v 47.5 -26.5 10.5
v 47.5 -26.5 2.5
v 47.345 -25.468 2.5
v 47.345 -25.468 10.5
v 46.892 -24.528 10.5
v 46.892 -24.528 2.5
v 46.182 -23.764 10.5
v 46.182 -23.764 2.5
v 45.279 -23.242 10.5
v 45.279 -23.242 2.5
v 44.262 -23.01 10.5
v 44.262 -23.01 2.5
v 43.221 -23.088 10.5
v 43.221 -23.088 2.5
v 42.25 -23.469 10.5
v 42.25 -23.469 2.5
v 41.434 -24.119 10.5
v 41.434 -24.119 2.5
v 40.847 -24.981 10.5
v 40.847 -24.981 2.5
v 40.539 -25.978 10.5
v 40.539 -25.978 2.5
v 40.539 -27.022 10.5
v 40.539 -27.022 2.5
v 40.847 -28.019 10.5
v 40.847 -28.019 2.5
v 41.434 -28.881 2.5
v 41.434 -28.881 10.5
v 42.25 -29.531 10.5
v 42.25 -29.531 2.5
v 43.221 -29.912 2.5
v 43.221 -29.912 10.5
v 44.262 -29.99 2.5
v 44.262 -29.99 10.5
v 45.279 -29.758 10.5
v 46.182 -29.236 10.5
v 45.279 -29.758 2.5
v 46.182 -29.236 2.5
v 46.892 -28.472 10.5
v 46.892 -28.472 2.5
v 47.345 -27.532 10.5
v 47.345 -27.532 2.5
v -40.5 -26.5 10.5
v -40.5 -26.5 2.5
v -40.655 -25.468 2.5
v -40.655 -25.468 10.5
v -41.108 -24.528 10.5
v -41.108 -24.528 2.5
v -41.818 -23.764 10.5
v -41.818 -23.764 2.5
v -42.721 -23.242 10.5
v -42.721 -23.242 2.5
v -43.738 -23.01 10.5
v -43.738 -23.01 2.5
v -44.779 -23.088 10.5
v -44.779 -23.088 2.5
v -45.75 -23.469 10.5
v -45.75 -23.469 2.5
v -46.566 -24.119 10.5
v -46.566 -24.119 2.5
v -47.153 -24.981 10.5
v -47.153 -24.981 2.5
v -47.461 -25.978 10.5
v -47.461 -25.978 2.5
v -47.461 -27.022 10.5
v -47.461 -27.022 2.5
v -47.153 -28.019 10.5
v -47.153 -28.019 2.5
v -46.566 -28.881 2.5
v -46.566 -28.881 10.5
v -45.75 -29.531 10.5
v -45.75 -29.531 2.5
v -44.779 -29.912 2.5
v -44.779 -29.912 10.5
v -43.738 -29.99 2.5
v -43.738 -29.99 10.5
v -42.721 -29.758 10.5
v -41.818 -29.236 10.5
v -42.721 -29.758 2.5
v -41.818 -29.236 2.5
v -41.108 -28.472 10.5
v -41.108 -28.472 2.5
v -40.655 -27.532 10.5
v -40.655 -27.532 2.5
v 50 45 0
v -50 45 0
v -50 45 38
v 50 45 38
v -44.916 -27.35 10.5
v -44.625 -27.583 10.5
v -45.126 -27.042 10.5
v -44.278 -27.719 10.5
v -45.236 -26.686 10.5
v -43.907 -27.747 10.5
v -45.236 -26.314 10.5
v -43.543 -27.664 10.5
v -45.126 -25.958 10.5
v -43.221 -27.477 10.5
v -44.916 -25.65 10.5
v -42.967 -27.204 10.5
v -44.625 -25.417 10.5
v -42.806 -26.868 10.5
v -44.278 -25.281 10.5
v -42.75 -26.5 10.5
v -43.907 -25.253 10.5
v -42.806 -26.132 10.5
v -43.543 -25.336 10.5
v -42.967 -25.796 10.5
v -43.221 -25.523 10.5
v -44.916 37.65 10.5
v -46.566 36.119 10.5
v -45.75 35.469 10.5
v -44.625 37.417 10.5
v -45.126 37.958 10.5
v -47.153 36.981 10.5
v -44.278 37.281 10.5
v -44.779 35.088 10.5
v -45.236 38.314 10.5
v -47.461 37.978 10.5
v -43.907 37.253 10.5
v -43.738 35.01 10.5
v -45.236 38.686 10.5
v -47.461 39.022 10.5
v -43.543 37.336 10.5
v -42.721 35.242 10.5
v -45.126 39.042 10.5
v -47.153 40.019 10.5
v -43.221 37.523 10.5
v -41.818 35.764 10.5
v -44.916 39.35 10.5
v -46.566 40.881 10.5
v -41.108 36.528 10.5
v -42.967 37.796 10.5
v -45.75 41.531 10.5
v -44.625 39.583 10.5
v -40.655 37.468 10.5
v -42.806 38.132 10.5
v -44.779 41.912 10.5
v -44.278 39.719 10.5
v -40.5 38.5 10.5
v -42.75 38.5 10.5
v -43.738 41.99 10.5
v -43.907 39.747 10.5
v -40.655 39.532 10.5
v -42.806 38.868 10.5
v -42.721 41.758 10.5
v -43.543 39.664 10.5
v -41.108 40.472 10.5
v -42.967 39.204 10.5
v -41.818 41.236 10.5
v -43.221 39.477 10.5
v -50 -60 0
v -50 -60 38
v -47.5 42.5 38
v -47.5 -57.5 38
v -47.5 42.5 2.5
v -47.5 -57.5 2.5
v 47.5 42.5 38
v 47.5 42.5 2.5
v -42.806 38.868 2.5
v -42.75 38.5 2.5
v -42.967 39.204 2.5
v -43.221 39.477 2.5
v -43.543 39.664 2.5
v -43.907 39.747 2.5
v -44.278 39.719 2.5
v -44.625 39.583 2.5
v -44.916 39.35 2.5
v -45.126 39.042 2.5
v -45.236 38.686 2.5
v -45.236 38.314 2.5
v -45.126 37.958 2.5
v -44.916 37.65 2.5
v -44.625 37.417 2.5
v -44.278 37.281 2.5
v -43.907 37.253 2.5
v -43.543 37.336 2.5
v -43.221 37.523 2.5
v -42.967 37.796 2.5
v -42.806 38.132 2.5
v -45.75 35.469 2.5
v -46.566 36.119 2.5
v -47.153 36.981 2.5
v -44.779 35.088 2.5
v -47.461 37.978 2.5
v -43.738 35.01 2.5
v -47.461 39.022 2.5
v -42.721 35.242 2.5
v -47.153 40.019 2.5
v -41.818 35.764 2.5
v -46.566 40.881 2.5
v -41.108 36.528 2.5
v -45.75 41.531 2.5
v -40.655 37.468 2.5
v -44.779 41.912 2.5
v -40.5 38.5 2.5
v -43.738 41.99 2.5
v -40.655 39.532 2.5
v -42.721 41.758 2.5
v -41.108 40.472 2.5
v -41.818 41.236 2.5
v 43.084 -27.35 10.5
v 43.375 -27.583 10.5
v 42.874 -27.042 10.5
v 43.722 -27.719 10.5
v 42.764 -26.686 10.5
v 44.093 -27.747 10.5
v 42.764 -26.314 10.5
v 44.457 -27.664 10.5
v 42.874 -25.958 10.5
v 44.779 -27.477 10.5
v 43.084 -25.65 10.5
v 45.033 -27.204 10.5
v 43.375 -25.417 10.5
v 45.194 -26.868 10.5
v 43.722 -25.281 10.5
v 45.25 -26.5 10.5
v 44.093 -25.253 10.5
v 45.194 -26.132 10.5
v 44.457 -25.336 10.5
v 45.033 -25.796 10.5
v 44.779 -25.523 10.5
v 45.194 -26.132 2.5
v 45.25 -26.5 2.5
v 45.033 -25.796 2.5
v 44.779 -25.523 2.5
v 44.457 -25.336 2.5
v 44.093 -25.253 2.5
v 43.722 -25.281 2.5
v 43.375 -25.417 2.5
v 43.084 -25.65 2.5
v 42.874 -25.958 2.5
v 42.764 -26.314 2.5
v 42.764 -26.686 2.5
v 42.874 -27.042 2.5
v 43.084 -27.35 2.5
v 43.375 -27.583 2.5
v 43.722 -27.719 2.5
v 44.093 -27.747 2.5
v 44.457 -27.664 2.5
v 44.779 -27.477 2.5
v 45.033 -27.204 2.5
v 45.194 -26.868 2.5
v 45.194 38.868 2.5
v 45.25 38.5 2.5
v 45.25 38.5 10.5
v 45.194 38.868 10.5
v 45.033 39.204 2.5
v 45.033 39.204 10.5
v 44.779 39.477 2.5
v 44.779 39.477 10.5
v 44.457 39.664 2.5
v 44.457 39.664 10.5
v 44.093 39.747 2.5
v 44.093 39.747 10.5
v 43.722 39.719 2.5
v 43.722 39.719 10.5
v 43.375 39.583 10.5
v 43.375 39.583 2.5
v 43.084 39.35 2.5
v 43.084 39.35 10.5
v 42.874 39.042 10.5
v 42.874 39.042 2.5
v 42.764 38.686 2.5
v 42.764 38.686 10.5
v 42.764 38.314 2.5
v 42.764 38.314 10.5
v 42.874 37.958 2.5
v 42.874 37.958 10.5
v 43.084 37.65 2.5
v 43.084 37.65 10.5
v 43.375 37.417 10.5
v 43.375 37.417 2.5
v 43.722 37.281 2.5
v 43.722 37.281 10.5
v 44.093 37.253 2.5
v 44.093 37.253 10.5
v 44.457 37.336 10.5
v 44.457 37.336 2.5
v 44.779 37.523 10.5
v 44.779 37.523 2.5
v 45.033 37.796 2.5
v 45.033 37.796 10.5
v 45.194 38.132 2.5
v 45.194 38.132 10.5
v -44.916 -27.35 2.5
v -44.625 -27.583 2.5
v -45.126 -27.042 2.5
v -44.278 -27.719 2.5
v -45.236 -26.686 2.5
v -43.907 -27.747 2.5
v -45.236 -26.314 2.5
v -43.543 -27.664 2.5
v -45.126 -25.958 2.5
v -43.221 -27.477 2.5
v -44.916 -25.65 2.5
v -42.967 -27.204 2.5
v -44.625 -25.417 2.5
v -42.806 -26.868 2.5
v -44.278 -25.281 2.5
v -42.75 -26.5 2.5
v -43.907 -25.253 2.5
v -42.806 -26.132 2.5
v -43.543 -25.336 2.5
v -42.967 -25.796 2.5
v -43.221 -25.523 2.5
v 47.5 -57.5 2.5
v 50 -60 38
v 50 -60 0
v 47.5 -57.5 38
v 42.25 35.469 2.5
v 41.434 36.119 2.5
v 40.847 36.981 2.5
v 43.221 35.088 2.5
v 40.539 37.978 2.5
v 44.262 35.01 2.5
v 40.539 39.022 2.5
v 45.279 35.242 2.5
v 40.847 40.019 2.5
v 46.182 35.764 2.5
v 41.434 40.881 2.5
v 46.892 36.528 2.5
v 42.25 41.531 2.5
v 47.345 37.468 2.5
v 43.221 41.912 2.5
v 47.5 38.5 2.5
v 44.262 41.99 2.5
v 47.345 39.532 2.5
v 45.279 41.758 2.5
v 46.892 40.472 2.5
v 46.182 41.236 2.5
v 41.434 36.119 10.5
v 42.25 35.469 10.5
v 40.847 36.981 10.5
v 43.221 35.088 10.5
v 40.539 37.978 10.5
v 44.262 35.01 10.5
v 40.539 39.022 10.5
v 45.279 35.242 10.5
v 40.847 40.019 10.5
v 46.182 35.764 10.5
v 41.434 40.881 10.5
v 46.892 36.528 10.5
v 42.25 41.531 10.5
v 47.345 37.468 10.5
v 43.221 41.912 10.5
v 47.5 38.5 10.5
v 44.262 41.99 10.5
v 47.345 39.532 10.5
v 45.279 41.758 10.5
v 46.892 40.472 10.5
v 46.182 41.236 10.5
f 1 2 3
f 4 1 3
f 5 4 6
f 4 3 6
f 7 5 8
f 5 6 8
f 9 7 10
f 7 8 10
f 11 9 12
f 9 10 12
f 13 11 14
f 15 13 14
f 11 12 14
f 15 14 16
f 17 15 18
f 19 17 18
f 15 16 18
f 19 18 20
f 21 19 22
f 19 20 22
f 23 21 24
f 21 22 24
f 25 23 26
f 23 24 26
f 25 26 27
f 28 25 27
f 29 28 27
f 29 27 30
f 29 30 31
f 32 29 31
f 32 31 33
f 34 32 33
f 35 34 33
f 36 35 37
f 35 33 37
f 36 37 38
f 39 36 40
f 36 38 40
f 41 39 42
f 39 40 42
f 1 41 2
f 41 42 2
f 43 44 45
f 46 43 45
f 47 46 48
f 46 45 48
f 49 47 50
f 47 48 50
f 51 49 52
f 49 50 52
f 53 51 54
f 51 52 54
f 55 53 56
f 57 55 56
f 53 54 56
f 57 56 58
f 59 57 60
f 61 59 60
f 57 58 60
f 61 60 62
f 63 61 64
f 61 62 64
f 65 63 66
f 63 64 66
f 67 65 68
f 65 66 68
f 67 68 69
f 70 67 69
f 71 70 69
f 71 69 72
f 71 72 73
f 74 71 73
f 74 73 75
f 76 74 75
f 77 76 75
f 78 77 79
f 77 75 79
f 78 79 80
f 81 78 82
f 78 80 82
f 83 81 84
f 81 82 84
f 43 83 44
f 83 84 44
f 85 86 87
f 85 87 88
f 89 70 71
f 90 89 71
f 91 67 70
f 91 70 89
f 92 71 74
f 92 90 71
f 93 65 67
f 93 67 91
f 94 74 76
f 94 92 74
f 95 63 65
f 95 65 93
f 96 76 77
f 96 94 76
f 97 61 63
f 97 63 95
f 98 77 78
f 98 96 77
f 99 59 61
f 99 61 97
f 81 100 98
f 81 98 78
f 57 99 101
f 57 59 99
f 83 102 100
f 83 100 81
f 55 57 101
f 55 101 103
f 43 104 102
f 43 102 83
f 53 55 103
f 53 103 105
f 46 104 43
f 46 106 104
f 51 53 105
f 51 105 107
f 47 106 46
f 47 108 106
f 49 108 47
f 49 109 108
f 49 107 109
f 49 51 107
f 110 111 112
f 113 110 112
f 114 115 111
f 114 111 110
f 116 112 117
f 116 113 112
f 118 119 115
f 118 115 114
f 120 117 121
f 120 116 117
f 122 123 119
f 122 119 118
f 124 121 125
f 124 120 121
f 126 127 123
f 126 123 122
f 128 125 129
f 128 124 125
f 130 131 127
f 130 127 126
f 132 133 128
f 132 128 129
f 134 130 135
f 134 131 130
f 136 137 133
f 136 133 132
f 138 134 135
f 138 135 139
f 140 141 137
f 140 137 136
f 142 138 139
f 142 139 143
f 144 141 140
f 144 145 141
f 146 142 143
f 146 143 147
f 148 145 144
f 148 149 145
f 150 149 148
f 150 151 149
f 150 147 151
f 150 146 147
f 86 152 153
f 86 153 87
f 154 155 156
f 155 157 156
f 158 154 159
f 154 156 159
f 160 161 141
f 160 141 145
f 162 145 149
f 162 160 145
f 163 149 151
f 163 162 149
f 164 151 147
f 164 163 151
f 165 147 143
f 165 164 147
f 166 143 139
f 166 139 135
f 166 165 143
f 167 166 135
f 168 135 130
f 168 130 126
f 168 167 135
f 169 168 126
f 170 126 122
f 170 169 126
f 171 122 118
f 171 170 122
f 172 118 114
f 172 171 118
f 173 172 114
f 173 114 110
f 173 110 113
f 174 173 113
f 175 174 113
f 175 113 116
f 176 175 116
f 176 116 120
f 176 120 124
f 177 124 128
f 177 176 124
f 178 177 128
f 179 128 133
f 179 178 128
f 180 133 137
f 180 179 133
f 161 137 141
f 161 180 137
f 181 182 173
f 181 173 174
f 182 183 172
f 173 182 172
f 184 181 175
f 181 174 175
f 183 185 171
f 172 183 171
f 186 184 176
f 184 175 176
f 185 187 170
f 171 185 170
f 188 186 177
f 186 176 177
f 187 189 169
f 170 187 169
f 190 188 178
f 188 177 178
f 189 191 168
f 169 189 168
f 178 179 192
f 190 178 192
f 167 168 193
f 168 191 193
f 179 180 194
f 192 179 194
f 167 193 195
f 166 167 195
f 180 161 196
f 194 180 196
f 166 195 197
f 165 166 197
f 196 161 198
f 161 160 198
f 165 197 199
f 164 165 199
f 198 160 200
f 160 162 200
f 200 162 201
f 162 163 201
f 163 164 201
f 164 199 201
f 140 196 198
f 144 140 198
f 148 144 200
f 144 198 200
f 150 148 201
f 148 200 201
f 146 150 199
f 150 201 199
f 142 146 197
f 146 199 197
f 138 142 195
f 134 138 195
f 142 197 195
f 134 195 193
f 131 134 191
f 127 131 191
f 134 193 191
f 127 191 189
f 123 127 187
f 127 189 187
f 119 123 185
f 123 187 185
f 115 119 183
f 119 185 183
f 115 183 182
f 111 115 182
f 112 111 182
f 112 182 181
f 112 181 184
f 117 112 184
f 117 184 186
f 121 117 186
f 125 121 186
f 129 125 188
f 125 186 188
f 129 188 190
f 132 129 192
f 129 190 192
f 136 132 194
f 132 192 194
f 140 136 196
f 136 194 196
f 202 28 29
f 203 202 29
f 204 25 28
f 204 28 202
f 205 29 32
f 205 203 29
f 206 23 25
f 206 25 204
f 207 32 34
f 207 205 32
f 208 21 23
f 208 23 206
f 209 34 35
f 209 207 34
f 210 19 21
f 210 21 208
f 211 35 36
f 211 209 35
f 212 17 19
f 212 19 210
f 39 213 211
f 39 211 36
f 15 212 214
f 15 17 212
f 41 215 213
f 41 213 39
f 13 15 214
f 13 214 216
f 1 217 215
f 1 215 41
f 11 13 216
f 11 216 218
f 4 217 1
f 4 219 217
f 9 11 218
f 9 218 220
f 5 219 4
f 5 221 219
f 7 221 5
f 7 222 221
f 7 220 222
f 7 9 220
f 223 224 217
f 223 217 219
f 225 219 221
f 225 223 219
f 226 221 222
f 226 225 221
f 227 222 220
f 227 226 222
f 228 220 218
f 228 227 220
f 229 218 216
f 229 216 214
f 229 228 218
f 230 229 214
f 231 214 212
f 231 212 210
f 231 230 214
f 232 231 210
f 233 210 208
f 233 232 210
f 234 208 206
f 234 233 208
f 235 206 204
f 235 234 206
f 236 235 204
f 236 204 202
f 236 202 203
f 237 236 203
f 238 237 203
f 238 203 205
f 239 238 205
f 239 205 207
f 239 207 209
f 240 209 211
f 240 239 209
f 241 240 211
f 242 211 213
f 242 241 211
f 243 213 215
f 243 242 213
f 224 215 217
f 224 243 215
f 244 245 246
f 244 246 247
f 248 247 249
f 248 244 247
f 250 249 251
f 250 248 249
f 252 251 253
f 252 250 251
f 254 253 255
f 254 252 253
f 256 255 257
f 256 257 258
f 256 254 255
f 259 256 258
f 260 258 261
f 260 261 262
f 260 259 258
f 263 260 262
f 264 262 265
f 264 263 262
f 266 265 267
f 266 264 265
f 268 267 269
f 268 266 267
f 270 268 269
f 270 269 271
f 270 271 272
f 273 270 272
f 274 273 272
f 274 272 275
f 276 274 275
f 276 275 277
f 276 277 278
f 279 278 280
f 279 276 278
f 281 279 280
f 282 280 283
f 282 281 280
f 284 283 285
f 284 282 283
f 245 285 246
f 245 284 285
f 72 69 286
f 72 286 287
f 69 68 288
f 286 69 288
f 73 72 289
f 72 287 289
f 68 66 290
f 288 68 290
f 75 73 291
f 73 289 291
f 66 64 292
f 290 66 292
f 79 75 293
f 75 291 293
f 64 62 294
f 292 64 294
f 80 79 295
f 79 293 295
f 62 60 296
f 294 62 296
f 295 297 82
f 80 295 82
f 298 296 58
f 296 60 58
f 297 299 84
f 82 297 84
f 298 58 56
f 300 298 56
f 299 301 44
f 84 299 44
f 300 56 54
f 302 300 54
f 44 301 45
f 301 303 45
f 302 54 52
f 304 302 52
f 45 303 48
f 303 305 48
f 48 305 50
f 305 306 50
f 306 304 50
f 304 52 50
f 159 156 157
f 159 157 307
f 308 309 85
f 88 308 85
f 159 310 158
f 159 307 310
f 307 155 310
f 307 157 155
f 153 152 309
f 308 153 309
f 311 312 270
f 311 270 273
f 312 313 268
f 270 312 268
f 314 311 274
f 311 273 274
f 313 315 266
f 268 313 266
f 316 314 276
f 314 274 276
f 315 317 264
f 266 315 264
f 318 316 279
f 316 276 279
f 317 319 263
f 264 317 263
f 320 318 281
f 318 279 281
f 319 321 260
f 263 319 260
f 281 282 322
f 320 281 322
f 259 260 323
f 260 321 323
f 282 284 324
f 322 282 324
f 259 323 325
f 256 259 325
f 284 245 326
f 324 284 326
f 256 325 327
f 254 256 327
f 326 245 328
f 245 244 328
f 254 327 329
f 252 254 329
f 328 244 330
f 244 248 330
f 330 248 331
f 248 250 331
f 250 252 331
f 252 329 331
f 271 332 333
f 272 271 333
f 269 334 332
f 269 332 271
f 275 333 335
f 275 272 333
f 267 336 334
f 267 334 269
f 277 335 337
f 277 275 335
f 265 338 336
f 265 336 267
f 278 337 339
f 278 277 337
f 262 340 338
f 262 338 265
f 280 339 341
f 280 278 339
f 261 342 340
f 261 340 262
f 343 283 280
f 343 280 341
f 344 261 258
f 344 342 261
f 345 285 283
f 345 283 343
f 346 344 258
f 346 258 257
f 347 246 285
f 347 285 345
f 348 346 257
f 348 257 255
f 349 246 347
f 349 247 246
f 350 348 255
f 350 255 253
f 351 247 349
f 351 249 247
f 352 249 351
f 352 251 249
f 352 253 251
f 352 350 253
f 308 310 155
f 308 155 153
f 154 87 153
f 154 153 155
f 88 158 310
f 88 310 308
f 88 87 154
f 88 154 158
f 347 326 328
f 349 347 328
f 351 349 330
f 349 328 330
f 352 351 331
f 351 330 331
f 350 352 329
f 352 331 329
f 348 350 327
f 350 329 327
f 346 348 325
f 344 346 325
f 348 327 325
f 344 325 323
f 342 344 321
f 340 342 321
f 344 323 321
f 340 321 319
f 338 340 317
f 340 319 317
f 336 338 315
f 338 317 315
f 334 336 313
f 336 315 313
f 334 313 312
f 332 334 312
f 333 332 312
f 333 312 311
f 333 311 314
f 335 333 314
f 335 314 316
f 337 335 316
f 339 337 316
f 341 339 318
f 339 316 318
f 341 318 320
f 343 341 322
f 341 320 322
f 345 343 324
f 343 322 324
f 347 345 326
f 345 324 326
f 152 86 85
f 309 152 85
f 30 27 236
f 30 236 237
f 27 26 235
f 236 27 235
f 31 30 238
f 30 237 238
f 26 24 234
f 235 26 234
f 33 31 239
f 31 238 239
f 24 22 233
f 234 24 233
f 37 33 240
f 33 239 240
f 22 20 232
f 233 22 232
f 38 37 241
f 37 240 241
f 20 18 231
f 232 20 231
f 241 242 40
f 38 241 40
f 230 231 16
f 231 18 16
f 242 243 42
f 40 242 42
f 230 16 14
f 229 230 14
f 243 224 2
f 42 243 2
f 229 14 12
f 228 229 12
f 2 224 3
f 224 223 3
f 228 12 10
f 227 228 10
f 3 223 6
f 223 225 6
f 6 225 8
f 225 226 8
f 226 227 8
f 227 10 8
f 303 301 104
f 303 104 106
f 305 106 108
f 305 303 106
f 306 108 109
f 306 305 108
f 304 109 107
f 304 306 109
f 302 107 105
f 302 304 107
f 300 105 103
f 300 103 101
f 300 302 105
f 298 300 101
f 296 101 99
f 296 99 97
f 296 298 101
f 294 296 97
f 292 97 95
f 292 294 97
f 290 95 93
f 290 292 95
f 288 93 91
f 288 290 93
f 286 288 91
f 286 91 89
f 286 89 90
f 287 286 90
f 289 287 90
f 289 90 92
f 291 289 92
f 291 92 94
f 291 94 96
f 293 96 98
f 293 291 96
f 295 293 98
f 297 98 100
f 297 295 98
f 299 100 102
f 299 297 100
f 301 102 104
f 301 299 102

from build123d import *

# Parameters (mm, degrees)
F0_W     = 100
F0_H     = 105
F1_DEPTH = 38
F2_T     = -2.5
F4_R     = 3.5
F4_R_2   = 1.25
F5_DEPTH = 8


with BuildPart() as f1:
    # F0 (on Top) → F1 (new body)
    with BuildSketch(Plane.XY):
        with Locations((0, -7.5)):
            Rectangle(F0_W, F0_H)
    extrude(amount=F1_DEPTH)

    # F2
    f2_openings = [f1.faces().sort_by_distance(p)[0] for p in [
        (0, -7.5, 38),
    ]]
    offset(amount=F2_T, openings=f2_openings)


with BuildPart() as f5:
    # F4 (on offset) → F5 (new body)
    with BuildSketch(Plane.XY.offset(2.5)):
        with Locations((44, 38.5)):
            Circle(F4_R)
        with Locations((44, 38.5)):
            Circle(F4_R_2, mode=Mode.SUBTRACT)
    extrude(amount=F5_DEPTH)


with BuildPart() as f5b:
    # F4 (on offset) → F5, piece 2 (new body)
    with BuildSketch(Plane.XY.offset(2.5)):
        with Locations((-44, 38.5)):
            Circle(F4_R)
        with Locations((-44, 38.5)):
            Circle(F4_R_2, mode=Mode.SUBTRACT)
    extrude(amount=F5_DEPTH)


with BuildPart() as f5c:
    # F4 (on offset) → F5, piece 3 (new body)
    with BuildSketch(Plane.XY.offset(2.5)):
        with Locations((-44, -26.5)):
            Circle(F4_R)
        with Locations((-44, -26.5)):
            Circle(F4_R_2, mode=Mode.SUBTRACT)
    extrude(amount=F5_DEPTH)


with BuildPart() as f5d:
    # F4 (on offset) → F5, piece 4 (new body)
    with BuildSketch(Plane.XY.offset(2.5)):
        with Locations((44, -26.5)):
            Circle(F4_R)
        with Locations((44, -26.5)):
            Circle(F4_R_2, mode=Mode.SUBTRACT)
    extrude(amount=F5_DEPTH)


solid = Compound([f1.part, f5.part, f5b.part, f5c.part, f5d.part])
